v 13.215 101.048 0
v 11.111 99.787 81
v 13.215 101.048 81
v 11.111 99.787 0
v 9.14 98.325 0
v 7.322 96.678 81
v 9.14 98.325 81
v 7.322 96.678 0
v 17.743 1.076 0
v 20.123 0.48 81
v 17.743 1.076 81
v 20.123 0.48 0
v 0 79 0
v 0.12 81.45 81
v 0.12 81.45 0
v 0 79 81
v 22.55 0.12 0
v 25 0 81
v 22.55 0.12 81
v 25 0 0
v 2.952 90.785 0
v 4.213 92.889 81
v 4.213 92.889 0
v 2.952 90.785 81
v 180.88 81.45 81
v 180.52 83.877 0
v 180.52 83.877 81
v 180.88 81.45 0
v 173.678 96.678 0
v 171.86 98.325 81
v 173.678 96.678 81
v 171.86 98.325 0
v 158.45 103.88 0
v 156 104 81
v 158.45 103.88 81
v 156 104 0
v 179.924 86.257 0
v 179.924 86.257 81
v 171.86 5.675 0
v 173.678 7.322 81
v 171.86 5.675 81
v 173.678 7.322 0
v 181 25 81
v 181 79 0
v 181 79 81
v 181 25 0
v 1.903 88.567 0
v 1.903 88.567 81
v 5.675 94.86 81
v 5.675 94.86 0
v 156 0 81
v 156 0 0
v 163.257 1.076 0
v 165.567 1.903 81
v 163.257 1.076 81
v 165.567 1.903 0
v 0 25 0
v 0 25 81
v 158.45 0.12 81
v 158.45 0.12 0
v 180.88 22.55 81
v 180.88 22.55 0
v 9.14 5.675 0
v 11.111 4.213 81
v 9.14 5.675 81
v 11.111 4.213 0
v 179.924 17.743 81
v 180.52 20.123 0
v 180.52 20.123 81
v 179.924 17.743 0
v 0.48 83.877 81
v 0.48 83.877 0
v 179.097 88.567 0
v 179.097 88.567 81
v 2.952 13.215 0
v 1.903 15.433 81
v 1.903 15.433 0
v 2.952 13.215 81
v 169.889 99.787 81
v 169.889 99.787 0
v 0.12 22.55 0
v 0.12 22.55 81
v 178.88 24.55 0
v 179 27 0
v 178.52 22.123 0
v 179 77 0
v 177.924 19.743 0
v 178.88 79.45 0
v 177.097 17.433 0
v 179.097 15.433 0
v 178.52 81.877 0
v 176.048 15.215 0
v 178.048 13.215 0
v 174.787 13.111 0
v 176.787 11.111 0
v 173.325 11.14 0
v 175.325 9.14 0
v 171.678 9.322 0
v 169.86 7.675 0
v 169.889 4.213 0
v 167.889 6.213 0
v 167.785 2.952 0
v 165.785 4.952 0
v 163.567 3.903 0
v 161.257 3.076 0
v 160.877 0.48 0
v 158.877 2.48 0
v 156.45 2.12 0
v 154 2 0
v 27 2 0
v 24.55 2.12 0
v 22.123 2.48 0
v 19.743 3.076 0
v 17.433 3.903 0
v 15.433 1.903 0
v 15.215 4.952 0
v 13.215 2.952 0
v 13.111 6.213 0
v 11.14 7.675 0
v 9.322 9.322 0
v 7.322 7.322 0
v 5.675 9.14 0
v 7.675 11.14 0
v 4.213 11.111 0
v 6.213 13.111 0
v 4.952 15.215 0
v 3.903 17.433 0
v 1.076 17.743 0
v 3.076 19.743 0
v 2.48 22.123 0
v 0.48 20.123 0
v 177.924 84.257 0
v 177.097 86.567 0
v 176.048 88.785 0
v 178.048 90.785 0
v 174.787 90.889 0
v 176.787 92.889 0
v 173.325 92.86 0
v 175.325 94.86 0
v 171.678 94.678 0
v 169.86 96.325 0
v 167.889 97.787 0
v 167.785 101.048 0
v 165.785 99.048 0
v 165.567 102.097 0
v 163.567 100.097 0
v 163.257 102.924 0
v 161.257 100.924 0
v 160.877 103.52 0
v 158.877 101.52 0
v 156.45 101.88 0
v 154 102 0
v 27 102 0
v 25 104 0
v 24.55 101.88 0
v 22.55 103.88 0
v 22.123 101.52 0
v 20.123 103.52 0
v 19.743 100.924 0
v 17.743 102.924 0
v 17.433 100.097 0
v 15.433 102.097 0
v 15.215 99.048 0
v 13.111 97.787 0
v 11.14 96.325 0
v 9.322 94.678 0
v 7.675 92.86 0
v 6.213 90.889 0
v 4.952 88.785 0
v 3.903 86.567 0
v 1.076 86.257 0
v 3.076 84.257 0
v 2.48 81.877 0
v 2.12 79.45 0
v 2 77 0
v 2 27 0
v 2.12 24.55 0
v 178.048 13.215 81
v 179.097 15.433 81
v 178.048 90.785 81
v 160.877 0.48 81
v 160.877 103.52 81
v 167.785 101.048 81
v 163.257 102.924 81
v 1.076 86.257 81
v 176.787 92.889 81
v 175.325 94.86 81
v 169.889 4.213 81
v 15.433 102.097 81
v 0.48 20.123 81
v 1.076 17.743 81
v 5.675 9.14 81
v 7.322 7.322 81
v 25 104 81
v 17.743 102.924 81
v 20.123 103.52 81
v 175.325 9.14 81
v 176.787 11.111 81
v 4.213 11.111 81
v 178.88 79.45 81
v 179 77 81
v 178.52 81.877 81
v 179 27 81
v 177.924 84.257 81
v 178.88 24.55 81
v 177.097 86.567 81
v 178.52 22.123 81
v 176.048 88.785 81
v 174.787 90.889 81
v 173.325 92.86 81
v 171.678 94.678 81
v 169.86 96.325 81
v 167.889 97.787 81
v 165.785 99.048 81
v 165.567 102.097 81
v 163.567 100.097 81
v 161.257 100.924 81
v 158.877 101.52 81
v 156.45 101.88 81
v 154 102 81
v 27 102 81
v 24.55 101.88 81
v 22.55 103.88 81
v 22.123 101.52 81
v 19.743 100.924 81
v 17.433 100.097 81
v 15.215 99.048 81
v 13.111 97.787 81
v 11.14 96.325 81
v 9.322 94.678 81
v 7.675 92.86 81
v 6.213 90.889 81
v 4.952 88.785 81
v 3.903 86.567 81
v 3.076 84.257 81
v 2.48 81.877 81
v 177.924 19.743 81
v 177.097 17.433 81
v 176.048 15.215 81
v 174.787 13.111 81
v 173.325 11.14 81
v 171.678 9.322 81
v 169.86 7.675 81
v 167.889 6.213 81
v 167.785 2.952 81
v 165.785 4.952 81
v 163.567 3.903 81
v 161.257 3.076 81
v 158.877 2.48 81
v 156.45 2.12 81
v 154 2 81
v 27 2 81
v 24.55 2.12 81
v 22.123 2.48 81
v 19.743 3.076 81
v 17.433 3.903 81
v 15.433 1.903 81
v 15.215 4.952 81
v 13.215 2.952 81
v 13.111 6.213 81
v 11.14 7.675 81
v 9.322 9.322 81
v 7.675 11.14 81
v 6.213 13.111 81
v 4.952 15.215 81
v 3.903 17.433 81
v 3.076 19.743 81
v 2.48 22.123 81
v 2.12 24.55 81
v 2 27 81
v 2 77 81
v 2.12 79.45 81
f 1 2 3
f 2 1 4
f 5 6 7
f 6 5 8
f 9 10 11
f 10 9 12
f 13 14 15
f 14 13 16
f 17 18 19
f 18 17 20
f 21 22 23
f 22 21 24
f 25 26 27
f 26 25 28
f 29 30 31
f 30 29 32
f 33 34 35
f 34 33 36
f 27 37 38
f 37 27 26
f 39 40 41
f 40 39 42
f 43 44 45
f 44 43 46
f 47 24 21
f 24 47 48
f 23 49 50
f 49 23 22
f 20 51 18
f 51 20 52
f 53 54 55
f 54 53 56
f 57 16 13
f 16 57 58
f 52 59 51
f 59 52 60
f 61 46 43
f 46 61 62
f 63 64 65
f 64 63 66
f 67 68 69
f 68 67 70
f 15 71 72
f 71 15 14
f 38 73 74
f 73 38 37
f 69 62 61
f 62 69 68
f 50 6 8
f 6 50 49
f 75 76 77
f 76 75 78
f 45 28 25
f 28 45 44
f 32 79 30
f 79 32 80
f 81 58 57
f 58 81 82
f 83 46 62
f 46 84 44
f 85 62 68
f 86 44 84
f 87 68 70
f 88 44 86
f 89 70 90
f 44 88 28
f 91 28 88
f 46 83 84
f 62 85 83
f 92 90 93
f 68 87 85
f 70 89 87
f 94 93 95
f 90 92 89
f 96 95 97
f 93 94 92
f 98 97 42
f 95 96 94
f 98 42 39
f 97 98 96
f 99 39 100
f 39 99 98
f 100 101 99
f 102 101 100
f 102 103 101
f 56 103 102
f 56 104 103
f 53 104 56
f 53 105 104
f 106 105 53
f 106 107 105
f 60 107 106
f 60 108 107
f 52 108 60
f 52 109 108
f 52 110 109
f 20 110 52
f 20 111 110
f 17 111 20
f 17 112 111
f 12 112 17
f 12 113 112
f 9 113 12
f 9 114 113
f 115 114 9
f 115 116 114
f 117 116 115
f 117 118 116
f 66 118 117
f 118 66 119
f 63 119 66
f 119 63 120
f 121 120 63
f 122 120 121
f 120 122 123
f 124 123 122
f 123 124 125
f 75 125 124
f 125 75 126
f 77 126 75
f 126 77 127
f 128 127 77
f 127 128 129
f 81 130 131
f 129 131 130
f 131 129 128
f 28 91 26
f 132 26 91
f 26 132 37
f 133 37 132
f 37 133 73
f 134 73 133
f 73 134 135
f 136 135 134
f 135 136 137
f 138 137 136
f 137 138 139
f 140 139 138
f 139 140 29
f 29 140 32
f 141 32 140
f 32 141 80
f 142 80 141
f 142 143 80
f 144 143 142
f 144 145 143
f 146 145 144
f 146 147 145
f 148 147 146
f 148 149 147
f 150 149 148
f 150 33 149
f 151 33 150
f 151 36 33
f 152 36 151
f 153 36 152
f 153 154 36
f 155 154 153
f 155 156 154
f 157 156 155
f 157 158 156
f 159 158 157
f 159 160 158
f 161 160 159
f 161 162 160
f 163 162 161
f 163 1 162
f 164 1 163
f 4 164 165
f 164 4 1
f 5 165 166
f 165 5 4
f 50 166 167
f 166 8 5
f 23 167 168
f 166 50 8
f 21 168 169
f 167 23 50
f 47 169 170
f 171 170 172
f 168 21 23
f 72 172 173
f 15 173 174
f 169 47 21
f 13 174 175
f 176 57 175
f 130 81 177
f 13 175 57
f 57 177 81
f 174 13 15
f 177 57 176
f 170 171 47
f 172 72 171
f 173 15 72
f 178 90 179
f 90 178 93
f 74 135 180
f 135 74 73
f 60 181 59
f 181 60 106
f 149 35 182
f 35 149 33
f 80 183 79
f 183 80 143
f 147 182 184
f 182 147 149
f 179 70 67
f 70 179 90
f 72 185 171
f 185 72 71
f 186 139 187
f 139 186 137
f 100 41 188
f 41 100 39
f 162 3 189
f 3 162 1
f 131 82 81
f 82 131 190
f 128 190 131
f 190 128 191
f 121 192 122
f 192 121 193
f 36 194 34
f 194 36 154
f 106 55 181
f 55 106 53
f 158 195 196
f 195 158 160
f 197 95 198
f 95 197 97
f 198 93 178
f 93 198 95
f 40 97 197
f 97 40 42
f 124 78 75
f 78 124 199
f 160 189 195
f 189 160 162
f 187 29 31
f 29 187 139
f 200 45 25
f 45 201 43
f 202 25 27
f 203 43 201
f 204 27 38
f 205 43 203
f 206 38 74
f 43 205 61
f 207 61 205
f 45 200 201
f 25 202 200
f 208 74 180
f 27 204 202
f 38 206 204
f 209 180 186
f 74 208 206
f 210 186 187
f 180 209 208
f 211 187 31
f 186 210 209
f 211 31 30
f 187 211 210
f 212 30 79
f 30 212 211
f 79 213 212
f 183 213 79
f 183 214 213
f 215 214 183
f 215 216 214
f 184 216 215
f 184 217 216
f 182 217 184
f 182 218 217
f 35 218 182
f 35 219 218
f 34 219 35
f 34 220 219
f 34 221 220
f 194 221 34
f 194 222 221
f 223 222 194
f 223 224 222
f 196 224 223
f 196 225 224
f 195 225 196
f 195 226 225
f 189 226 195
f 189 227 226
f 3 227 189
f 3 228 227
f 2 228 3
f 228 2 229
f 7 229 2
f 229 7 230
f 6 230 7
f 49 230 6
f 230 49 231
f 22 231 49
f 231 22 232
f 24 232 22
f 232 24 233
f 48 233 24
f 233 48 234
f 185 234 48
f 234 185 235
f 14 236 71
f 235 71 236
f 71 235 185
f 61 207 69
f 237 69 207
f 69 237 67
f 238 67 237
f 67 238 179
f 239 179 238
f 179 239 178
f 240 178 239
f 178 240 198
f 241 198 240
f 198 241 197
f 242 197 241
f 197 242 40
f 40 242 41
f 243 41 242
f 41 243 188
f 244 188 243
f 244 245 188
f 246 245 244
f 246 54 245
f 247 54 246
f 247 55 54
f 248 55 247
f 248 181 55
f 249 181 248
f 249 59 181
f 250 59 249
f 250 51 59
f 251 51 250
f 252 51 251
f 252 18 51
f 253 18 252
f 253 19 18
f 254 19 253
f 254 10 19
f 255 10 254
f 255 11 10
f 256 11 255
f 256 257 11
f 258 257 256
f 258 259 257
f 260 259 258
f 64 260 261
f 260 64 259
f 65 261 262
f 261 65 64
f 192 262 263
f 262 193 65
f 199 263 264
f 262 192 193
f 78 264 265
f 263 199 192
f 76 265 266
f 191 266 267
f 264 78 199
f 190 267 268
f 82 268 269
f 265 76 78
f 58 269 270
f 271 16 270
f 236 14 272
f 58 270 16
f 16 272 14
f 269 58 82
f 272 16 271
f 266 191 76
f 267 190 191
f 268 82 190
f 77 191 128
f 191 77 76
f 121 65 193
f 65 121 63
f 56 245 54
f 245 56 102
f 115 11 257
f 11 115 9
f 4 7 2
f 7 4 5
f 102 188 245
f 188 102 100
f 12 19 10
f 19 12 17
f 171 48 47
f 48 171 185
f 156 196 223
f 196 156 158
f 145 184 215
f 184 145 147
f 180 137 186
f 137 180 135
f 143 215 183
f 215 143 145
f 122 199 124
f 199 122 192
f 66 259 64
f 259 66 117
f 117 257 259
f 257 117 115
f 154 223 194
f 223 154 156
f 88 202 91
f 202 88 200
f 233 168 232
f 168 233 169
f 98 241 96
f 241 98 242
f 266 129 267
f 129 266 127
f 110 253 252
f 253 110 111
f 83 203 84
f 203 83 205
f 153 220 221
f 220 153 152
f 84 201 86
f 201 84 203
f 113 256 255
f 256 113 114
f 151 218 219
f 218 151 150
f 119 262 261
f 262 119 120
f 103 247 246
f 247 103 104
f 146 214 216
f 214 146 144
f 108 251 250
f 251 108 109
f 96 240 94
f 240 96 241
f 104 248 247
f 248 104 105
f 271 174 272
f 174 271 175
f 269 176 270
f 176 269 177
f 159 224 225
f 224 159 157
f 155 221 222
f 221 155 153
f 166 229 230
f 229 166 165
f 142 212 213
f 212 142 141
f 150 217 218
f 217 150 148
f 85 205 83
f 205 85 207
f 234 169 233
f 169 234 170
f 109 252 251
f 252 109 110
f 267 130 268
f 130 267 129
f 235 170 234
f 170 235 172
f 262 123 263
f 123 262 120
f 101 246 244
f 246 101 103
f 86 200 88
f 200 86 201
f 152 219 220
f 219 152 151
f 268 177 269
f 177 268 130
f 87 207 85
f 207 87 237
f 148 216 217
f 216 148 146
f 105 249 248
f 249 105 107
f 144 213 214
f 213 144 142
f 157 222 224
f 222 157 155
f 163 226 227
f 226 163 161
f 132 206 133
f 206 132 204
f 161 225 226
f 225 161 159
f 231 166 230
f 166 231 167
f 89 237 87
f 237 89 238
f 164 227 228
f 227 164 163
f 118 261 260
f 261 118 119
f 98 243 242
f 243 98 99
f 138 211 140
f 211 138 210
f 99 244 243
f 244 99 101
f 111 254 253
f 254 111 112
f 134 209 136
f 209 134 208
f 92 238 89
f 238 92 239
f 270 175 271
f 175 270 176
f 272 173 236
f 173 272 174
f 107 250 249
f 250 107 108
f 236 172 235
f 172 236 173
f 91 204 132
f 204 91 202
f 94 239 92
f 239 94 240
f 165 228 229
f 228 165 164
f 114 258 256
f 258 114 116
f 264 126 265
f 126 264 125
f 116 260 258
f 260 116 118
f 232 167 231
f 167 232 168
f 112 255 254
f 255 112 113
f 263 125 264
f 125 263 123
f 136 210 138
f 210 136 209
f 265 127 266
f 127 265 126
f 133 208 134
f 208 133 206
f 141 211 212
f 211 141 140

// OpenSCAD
$fn=64;
difference(){
minkowski(){
translate([25,25,0])
cylinder(h=80,r=25,center=false);
cube([131,54,1]);
}

minkowski(){
translate([27,27,0])
cylinder(h=80,r=25,center=false);
#cube([127,50,1]);
}

}
